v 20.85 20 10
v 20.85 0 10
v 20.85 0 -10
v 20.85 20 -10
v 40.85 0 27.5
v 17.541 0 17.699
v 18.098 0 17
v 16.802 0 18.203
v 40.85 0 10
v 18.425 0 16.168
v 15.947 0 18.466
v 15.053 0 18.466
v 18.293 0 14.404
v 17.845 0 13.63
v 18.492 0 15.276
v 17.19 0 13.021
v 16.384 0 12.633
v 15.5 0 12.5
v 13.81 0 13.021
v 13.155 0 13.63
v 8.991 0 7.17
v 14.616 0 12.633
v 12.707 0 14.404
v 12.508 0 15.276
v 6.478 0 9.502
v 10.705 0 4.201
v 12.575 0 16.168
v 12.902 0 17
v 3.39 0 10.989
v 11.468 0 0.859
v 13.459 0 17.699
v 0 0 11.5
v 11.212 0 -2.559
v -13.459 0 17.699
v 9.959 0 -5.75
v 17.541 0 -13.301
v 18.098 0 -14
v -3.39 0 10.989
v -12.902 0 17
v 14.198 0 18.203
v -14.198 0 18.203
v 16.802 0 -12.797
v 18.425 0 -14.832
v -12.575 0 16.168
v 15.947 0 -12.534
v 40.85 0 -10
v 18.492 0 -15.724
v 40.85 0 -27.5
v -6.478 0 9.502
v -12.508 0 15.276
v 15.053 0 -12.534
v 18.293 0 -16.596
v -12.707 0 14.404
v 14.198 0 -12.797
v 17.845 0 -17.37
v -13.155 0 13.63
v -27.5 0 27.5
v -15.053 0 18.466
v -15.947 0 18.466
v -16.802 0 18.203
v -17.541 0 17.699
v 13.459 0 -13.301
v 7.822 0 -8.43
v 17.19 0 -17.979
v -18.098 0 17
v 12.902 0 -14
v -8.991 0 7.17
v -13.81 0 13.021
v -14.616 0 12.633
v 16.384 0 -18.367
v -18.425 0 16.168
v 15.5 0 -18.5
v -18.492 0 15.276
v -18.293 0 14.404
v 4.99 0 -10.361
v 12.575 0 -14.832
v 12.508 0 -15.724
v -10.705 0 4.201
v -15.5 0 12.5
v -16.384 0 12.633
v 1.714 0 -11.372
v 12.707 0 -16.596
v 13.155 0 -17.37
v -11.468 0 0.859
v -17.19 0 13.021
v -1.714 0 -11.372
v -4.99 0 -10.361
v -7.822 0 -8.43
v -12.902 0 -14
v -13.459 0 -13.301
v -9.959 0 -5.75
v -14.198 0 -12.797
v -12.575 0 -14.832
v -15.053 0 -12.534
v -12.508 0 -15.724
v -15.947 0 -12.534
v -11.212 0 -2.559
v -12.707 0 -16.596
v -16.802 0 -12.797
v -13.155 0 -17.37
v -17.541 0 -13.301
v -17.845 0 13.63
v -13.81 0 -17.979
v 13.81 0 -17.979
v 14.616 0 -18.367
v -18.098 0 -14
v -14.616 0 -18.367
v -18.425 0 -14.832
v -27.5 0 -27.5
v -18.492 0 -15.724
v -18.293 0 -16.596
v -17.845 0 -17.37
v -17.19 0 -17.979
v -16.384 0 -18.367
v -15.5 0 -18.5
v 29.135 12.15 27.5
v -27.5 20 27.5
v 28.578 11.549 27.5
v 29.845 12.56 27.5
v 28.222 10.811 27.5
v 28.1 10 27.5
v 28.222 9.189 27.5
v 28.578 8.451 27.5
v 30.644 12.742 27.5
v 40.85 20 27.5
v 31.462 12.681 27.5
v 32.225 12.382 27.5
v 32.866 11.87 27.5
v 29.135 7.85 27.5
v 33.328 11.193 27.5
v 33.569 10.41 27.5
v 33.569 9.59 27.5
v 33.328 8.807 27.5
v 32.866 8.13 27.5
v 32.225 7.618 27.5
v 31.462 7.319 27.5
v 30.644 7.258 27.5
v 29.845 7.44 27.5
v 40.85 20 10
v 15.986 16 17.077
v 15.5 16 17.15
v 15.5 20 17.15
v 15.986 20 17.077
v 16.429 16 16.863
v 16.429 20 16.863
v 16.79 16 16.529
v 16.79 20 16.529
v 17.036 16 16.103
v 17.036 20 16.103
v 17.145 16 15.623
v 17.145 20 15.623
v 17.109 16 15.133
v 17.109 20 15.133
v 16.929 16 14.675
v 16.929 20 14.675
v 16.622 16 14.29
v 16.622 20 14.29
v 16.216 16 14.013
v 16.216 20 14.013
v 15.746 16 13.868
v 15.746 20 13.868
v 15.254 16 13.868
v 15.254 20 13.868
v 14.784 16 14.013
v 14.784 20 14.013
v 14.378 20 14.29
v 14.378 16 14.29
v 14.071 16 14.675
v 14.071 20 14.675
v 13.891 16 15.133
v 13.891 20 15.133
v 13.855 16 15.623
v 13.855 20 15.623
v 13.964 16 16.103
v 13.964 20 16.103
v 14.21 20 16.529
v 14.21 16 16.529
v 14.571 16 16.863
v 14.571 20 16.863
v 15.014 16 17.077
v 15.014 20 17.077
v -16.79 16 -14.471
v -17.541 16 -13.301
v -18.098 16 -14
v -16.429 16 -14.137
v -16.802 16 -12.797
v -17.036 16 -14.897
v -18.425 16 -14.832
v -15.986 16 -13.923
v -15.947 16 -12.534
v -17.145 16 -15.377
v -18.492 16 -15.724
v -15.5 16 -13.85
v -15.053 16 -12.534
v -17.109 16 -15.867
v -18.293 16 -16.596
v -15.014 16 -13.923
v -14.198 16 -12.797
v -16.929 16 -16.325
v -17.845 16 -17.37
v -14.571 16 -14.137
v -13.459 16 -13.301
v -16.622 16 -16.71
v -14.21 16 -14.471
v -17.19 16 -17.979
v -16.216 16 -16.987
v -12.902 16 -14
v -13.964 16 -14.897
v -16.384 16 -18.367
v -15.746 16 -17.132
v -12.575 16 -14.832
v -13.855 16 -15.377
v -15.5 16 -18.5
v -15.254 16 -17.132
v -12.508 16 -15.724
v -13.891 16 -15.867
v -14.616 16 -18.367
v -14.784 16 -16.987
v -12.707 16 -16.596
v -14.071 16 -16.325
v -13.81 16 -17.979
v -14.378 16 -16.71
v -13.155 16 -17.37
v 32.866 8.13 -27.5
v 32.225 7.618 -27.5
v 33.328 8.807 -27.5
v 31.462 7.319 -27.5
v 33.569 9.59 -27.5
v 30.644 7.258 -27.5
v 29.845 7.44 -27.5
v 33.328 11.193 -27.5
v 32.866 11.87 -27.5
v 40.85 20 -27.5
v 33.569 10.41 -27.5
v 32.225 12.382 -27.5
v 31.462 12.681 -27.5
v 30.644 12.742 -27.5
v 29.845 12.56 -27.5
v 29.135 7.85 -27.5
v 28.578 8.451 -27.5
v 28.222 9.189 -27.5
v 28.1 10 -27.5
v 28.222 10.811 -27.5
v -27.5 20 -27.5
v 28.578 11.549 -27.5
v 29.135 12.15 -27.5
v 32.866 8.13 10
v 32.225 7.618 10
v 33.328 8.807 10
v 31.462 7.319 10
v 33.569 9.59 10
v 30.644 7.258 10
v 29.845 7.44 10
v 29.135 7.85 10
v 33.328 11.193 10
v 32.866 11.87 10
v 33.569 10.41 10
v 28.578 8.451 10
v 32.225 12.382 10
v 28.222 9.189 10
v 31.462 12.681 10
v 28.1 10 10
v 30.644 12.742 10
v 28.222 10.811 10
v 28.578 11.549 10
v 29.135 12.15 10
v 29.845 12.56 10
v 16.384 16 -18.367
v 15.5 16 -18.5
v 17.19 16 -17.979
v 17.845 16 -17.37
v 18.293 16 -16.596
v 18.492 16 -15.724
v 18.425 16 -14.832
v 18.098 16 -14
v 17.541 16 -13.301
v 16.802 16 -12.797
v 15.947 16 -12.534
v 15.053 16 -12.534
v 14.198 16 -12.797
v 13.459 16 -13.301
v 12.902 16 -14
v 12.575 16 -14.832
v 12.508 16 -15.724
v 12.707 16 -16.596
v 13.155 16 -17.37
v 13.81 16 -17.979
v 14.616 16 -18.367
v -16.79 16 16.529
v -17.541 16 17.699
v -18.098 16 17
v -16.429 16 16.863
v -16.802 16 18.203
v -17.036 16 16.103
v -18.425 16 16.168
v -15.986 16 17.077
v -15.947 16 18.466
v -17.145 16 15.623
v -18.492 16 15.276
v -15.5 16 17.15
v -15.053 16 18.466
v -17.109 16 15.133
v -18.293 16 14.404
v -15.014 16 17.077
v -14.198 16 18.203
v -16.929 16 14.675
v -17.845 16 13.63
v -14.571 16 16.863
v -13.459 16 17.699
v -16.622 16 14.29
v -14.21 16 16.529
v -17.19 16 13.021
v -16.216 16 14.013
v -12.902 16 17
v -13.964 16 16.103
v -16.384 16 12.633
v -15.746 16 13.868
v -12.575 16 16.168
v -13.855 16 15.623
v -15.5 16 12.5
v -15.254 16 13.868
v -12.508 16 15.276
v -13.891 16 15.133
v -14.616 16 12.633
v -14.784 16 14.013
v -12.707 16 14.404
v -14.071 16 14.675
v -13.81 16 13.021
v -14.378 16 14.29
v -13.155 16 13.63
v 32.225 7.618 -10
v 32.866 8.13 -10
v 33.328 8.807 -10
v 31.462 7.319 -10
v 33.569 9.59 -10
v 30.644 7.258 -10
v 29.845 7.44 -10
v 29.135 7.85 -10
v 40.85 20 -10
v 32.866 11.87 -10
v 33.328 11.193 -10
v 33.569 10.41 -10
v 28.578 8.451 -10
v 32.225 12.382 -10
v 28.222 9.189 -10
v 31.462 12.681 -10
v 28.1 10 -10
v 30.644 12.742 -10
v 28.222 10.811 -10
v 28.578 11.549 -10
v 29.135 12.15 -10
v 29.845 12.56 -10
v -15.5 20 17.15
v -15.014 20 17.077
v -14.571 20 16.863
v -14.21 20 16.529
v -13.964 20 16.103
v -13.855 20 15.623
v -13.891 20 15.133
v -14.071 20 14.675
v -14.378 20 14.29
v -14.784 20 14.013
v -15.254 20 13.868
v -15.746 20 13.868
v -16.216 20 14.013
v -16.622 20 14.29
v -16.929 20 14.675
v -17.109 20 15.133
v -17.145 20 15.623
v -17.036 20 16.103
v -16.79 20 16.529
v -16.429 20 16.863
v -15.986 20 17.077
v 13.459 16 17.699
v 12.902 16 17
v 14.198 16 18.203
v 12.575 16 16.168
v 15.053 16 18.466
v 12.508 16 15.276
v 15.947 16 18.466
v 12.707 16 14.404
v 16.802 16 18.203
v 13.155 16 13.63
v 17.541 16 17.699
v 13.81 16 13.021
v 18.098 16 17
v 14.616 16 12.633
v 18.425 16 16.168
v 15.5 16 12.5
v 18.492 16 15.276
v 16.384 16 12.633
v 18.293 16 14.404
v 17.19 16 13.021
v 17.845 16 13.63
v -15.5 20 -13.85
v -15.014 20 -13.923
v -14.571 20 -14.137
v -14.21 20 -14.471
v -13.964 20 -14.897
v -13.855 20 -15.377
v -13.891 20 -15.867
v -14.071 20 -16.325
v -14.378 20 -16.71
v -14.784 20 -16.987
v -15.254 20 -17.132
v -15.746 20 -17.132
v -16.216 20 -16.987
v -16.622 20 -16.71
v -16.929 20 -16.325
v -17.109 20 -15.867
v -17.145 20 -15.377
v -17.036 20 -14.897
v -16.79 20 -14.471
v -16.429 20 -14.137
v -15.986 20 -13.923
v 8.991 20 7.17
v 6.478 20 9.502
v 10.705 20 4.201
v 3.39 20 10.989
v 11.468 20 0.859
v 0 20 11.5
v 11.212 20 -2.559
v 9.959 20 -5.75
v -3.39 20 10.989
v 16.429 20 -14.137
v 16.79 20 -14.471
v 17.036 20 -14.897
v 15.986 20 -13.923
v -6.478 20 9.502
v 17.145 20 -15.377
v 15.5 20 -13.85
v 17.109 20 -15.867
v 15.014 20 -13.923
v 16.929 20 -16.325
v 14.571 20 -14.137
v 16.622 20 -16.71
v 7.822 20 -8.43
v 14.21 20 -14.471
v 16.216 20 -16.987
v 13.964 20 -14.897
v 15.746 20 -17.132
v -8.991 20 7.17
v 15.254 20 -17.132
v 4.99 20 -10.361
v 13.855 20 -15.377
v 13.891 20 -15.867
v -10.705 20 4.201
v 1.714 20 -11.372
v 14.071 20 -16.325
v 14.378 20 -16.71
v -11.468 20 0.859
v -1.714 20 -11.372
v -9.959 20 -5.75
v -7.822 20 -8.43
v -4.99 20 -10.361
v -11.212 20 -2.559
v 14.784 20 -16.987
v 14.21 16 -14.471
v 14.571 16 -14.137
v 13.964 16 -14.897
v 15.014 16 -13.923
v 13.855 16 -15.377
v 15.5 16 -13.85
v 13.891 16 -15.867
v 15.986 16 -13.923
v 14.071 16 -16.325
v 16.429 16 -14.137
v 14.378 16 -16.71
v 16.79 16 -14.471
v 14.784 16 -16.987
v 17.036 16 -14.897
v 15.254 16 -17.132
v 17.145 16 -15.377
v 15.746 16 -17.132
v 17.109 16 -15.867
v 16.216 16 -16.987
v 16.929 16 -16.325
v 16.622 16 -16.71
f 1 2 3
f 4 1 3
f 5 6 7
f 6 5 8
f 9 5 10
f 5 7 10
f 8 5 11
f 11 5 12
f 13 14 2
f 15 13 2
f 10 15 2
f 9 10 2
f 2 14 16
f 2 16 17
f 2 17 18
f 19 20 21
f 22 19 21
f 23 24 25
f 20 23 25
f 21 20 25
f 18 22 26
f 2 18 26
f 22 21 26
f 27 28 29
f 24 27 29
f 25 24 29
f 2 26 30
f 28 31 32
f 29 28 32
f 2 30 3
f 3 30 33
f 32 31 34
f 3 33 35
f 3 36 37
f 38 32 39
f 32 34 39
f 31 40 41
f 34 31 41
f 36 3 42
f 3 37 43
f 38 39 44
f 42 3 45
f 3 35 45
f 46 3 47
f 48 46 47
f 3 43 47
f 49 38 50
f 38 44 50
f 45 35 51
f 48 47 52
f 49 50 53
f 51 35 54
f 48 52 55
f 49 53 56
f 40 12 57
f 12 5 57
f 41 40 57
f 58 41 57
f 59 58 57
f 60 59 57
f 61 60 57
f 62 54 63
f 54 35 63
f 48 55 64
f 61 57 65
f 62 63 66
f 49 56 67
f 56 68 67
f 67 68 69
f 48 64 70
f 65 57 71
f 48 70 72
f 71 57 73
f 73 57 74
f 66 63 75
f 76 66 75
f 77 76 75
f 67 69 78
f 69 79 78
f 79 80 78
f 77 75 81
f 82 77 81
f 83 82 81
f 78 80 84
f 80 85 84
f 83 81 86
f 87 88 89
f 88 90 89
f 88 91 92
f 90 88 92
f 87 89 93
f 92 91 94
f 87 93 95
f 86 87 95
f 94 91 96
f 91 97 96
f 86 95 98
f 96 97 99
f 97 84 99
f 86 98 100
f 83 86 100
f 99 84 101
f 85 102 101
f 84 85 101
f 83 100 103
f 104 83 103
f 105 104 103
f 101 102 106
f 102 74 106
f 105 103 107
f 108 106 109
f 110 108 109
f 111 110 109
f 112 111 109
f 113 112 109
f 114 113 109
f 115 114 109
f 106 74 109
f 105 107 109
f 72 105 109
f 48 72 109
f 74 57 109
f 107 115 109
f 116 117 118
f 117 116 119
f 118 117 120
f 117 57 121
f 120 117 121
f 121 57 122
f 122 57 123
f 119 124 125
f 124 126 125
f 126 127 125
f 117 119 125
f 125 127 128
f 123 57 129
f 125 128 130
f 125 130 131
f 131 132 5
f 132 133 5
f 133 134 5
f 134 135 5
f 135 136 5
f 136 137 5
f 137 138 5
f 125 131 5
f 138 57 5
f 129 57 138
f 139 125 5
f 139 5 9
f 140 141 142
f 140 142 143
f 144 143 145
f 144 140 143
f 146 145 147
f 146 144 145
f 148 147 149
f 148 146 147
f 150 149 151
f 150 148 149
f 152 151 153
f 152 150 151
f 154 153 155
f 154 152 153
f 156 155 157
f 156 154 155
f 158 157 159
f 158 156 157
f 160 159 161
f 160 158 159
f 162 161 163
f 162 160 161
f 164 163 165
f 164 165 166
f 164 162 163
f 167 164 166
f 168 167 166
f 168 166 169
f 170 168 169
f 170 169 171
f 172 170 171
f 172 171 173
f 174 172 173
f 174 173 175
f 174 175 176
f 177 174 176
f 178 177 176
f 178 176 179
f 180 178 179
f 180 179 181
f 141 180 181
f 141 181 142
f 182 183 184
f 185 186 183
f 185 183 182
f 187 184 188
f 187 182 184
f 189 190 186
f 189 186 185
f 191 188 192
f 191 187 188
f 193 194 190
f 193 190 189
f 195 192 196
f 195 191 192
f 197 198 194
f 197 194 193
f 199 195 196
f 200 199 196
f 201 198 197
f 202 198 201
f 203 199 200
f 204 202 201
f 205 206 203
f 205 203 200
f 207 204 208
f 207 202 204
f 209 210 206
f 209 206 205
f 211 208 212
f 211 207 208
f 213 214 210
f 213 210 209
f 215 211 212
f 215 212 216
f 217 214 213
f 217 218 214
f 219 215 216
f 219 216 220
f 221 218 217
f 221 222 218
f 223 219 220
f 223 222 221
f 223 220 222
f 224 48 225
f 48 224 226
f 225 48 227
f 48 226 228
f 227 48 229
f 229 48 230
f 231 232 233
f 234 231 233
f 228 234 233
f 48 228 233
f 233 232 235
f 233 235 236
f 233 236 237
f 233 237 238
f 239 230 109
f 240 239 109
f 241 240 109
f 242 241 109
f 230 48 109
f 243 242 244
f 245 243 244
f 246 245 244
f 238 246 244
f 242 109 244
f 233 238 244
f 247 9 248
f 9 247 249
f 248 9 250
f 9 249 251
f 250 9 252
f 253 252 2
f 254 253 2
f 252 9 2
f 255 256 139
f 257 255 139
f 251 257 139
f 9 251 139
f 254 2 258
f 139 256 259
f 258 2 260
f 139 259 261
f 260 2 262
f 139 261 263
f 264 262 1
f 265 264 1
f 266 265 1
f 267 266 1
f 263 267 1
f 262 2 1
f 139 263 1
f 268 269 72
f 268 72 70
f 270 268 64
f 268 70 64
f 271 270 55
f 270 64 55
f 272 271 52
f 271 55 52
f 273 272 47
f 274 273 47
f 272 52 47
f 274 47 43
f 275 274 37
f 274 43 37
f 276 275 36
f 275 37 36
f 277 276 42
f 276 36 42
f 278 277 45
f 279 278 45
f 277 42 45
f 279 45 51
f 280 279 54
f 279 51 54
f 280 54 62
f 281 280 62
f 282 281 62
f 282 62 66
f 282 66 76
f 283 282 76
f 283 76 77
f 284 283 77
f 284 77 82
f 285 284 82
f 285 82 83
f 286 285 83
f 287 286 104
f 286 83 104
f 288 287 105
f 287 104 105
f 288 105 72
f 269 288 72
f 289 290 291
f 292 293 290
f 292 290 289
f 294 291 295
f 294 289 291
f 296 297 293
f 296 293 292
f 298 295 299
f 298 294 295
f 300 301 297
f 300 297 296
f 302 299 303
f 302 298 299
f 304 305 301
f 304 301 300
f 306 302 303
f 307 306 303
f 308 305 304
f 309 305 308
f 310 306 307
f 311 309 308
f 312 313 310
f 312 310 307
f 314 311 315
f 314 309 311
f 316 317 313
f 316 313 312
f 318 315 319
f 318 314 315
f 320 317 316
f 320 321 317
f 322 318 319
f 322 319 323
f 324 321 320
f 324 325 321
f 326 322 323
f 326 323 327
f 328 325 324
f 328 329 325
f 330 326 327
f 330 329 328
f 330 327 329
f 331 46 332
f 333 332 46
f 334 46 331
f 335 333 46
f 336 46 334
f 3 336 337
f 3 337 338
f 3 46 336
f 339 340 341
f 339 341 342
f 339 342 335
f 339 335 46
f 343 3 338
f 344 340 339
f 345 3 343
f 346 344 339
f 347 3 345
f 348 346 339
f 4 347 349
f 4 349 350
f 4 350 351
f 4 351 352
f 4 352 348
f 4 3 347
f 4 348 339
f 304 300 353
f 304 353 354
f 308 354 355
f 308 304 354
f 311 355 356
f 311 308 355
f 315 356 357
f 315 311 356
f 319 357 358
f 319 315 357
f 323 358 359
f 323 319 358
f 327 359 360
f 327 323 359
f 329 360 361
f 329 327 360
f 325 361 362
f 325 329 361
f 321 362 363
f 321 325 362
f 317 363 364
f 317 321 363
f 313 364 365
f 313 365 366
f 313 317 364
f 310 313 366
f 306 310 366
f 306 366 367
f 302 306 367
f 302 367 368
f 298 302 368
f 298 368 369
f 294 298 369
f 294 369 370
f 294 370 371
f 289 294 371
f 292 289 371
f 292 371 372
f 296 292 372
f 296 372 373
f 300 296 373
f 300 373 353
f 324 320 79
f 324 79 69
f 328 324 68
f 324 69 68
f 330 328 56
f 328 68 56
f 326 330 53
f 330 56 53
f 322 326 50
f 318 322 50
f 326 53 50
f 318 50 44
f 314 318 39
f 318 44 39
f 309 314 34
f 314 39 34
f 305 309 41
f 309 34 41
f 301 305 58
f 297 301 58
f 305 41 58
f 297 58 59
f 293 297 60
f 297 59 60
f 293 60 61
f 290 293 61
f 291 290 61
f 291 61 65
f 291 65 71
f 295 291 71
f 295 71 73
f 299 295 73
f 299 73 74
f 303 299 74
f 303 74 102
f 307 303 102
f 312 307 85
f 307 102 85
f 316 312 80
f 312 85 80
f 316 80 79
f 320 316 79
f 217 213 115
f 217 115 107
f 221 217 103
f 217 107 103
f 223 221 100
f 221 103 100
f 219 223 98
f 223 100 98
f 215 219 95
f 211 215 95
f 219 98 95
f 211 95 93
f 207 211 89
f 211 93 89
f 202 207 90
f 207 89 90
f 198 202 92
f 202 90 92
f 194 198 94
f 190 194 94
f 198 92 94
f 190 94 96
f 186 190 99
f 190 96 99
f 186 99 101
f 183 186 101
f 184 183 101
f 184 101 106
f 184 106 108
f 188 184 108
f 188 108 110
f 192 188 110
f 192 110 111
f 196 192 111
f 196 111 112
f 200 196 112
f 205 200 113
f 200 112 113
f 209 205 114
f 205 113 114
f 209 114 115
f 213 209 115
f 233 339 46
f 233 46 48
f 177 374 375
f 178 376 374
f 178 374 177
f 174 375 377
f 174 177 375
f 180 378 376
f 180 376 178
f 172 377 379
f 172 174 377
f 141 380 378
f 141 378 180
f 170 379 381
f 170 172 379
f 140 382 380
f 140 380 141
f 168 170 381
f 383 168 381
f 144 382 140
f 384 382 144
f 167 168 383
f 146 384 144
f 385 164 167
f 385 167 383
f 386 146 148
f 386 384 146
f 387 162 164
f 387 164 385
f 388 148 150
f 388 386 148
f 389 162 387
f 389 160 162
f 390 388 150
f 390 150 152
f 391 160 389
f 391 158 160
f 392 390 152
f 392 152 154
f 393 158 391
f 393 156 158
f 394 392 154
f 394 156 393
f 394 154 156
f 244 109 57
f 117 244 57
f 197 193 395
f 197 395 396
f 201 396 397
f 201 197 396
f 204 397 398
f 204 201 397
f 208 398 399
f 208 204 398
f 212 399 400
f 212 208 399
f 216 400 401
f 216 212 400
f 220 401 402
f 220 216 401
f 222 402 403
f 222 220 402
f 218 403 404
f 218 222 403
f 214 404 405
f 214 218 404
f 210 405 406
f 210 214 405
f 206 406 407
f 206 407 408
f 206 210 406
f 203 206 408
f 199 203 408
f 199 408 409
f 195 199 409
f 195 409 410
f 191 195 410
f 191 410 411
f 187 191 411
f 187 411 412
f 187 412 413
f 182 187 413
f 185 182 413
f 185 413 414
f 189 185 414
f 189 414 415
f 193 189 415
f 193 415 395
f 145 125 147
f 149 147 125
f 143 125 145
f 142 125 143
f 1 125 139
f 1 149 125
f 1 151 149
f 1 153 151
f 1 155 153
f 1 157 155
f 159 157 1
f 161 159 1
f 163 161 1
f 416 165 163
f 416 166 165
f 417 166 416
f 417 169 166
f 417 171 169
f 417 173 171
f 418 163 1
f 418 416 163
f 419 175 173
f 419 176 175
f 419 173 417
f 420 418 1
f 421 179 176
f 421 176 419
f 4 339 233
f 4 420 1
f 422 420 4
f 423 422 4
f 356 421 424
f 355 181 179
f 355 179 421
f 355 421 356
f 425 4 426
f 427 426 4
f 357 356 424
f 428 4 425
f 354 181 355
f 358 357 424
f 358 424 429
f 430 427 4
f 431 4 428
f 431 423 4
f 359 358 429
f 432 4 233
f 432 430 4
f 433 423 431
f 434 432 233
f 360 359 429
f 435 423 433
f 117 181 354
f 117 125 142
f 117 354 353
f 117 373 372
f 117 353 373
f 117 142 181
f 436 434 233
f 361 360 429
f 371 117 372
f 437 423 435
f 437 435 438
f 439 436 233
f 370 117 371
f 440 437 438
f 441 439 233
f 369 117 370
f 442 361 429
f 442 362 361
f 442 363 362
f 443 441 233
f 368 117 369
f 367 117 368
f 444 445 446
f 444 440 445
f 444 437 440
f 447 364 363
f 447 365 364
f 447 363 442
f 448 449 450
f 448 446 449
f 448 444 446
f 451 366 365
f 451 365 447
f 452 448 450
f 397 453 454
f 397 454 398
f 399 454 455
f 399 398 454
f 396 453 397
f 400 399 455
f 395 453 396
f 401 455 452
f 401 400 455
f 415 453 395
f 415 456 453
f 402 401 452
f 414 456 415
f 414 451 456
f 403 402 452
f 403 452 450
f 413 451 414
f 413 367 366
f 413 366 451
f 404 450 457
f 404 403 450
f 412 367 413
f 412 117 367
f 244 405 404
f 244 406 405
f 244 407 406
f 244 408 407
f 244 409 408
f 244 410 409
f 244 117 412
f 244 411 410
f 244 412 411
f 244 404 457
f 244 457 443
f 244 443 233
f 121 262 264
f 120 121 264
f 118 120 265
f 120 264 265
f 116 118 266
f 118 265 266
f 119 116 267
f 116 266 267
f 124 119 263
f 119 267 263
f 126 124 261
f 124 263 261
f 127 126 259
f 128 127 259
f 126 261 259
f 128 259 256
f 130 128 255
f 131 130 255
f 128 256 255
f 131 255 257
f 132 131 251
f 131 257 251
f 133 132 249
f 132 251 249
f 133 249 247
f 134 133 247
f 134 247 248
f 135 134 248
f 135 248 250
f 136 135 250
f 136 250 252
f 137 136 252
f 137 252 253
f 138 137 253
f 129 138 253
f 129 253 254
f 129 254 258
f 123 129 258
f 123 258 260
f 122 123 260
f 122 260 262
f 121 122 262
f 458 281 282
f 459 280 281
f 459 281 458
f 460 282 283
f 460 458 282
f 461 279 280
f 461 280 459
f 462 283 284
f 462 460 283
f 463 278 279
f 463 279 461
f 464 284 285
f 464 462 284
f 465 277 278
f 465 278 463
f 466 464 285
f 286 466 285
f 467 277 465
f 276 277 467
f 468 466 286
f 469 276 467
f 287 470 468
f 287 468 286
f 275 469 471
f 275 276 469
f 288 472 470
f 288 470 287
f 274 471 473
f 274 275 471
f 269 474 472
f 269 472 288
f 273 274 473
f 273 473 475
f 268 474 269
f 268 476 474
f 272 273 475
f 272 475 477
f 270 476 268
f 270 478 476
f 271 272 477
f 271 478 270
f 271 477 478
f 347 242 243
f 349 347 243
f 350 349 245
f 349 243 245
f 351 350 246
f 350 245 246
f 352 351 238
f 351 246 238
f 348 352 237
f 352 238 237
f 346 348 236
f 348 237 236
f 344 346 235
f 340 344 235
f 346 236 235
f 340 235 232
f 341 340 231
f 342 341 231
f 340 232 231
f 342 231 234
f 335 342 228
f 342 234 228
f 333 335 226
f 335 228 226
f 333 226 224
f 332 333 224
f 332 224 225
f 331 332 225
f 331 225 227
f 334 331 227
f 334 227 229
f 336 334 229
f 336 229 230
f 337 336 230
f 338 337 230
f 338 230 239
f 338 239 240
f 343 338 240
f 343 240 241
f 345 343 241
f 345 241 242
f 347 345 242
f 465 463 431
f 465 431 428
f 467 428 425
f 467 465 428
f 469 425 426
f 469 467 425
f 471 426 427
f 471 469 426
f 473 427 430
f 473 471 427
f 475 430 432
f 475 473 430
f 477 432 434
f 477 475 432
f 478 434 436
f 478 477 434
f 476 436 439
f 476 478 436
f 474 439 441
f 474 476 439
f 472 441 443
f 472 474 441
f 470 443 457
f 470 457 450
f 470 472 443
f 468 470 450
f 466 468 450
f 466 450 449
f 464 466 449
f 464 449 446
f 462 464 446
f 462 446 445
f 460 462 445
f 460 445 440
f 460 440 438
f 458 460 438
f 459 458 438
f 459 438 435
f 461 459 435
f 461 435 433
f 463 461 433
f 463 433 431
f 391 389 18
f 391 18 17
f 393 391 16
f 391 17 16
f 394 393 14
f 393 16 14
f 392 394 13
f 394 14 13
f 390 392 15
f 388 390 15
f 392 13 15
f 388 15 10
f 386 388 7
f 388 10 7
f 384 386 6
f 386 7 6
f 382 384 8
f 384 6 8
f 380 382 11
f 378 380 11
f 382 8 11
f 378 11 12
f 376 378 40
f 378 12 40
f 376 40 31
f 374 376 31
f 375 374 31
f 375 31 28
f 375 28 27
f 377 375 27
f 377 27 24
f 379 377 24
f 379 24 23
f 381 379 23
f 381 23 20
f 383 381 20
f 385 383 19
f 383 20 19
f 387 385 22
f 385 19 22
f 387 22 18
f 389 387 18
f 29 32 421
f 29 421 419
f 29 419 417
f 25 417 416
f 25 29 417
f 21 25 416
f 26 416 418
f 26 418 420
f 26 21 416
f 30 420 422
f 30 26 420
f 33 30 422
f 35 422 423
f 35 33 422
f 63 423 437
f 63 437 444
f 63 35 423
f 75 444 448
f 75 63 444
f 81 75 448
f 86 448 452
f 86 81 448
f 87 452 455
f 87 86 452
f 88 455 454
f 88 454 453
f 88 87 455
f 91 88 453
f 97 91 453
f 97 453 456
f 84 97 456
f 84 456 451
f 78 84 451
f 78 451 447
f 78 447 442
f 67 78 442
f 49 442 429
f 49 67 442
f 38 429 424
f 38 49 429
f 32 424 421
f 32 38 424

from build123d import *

# Parameters (mm, degrees)
SKETCH_1_R          = 1.65
SKETCH_1_R_2        = 11.5
EXTRUDE_1_DEPTH     = 20
SKETCH_6_W          = 17.5
SKETCH_6_H          = 20
EXTRUDE_2_DEPTH     = 20
SKETCH_7_R          = 3
CUT_EXTRUDE_1_DEPTH = 16
SKETCH_8_R          = 2.75
CUT_EXTRUDE_2_DEPTH = 72.370319461


with BuildPart() as part:
    # 草图1 → 凸台-拉伸1 (new body)
    with BuildSketch(Plane(origin=(0, 0, 0), x_dir=(1, 0, 0), z_dir=(0, 1, 0))):
        Polygon((20.85, 20.85), (20.85, 27.5), (-27.5, 27.5), (-27.5, -27.5), (20.85, -27.5), align=None)
        with Locations(Location((-15.5, 15.5, 0), (0, 0, 270))):
            Circle(SKETCH_1_R, mode=Mode.SUBTRACT)
        with Locations(Location((15.5, 15.5, 0), (0, 0, 270))):
            Circle(SKETCH_1_R, mode=Mode.SUBTRACT)
        with Locations(Location((15.5, -15.5, 0), (0, 0, 270))):
            Circle(SKETCH_1_R, mode=Mode.SUBTRACT)
        with Locations(Location((-15.5, -15.5, 0), (0, 0, 270))):
            Circle(SKETCH_1_R, mode=Mode.SUBTRACT)
        with Locations(Location((0, 0, 0), (0, 0, 270))):
            Circle(SKETCH_1_R_2, mode=Mode.SUBTRACT)
    extrude(amount=EXTRUDE_1_DEPTH)

    # 草图6 → 凸台-拉伸2 (add)
    with BuildSketch(Plane(origin=(20.85, 0, 0), x_dir=(0, 0, -1), z_dir=(1, 0, 0))):
        with Locations((18.75, 10)):
            Rectangle(SKETCH_6_W, SKETCH_6_H)
        with Locations((-18.75, 10)):
            Rectangle(SKETCH_6_W, SKETCH_6_H)
    extrude(amount=EXTRUDE_2_DEPTH)

    # 草图7 → 切除-拉伸1 (cut)
    with BuildSketch(Plane.XZ):
        with Locations(Location((-15.5, 15.5, 0), (0, 0, 270))):
            Circle(SKETCH_7_R)
        with Locations(Location((15.5, 15.5, 0), (0, 0, 270))):
            Circle(SKETCH_7_R)
        with Locations(Location((15.5, -15.5, 0), (0, 0, 270))):
            Circle(SKETCH_7_R)
        with Locations(Location((-15.5, -15.5, 0), (0, 0, 270))):
            Circle(SKETCH_7_R)
    extrude(amount=-CUT_EXTRUDE_1_DEPTH, mode=Mode.SUBTRACT)

    # 草图8 → 切除-拉伸2 (cut, through all)
    with BuildSketch(Plane(origin=(0, 0, -27.5), x_dir=(-1, 0, 0), z_dir=(0, 0, -1))):
        with Locations((-30.85, 10)):
            Circle(SKETCH_8_R)
    extrude(amount=-CUT_EXTRUDE_2_DEPTH, mode=Mode.SUBTRACT)


solid = part.part
